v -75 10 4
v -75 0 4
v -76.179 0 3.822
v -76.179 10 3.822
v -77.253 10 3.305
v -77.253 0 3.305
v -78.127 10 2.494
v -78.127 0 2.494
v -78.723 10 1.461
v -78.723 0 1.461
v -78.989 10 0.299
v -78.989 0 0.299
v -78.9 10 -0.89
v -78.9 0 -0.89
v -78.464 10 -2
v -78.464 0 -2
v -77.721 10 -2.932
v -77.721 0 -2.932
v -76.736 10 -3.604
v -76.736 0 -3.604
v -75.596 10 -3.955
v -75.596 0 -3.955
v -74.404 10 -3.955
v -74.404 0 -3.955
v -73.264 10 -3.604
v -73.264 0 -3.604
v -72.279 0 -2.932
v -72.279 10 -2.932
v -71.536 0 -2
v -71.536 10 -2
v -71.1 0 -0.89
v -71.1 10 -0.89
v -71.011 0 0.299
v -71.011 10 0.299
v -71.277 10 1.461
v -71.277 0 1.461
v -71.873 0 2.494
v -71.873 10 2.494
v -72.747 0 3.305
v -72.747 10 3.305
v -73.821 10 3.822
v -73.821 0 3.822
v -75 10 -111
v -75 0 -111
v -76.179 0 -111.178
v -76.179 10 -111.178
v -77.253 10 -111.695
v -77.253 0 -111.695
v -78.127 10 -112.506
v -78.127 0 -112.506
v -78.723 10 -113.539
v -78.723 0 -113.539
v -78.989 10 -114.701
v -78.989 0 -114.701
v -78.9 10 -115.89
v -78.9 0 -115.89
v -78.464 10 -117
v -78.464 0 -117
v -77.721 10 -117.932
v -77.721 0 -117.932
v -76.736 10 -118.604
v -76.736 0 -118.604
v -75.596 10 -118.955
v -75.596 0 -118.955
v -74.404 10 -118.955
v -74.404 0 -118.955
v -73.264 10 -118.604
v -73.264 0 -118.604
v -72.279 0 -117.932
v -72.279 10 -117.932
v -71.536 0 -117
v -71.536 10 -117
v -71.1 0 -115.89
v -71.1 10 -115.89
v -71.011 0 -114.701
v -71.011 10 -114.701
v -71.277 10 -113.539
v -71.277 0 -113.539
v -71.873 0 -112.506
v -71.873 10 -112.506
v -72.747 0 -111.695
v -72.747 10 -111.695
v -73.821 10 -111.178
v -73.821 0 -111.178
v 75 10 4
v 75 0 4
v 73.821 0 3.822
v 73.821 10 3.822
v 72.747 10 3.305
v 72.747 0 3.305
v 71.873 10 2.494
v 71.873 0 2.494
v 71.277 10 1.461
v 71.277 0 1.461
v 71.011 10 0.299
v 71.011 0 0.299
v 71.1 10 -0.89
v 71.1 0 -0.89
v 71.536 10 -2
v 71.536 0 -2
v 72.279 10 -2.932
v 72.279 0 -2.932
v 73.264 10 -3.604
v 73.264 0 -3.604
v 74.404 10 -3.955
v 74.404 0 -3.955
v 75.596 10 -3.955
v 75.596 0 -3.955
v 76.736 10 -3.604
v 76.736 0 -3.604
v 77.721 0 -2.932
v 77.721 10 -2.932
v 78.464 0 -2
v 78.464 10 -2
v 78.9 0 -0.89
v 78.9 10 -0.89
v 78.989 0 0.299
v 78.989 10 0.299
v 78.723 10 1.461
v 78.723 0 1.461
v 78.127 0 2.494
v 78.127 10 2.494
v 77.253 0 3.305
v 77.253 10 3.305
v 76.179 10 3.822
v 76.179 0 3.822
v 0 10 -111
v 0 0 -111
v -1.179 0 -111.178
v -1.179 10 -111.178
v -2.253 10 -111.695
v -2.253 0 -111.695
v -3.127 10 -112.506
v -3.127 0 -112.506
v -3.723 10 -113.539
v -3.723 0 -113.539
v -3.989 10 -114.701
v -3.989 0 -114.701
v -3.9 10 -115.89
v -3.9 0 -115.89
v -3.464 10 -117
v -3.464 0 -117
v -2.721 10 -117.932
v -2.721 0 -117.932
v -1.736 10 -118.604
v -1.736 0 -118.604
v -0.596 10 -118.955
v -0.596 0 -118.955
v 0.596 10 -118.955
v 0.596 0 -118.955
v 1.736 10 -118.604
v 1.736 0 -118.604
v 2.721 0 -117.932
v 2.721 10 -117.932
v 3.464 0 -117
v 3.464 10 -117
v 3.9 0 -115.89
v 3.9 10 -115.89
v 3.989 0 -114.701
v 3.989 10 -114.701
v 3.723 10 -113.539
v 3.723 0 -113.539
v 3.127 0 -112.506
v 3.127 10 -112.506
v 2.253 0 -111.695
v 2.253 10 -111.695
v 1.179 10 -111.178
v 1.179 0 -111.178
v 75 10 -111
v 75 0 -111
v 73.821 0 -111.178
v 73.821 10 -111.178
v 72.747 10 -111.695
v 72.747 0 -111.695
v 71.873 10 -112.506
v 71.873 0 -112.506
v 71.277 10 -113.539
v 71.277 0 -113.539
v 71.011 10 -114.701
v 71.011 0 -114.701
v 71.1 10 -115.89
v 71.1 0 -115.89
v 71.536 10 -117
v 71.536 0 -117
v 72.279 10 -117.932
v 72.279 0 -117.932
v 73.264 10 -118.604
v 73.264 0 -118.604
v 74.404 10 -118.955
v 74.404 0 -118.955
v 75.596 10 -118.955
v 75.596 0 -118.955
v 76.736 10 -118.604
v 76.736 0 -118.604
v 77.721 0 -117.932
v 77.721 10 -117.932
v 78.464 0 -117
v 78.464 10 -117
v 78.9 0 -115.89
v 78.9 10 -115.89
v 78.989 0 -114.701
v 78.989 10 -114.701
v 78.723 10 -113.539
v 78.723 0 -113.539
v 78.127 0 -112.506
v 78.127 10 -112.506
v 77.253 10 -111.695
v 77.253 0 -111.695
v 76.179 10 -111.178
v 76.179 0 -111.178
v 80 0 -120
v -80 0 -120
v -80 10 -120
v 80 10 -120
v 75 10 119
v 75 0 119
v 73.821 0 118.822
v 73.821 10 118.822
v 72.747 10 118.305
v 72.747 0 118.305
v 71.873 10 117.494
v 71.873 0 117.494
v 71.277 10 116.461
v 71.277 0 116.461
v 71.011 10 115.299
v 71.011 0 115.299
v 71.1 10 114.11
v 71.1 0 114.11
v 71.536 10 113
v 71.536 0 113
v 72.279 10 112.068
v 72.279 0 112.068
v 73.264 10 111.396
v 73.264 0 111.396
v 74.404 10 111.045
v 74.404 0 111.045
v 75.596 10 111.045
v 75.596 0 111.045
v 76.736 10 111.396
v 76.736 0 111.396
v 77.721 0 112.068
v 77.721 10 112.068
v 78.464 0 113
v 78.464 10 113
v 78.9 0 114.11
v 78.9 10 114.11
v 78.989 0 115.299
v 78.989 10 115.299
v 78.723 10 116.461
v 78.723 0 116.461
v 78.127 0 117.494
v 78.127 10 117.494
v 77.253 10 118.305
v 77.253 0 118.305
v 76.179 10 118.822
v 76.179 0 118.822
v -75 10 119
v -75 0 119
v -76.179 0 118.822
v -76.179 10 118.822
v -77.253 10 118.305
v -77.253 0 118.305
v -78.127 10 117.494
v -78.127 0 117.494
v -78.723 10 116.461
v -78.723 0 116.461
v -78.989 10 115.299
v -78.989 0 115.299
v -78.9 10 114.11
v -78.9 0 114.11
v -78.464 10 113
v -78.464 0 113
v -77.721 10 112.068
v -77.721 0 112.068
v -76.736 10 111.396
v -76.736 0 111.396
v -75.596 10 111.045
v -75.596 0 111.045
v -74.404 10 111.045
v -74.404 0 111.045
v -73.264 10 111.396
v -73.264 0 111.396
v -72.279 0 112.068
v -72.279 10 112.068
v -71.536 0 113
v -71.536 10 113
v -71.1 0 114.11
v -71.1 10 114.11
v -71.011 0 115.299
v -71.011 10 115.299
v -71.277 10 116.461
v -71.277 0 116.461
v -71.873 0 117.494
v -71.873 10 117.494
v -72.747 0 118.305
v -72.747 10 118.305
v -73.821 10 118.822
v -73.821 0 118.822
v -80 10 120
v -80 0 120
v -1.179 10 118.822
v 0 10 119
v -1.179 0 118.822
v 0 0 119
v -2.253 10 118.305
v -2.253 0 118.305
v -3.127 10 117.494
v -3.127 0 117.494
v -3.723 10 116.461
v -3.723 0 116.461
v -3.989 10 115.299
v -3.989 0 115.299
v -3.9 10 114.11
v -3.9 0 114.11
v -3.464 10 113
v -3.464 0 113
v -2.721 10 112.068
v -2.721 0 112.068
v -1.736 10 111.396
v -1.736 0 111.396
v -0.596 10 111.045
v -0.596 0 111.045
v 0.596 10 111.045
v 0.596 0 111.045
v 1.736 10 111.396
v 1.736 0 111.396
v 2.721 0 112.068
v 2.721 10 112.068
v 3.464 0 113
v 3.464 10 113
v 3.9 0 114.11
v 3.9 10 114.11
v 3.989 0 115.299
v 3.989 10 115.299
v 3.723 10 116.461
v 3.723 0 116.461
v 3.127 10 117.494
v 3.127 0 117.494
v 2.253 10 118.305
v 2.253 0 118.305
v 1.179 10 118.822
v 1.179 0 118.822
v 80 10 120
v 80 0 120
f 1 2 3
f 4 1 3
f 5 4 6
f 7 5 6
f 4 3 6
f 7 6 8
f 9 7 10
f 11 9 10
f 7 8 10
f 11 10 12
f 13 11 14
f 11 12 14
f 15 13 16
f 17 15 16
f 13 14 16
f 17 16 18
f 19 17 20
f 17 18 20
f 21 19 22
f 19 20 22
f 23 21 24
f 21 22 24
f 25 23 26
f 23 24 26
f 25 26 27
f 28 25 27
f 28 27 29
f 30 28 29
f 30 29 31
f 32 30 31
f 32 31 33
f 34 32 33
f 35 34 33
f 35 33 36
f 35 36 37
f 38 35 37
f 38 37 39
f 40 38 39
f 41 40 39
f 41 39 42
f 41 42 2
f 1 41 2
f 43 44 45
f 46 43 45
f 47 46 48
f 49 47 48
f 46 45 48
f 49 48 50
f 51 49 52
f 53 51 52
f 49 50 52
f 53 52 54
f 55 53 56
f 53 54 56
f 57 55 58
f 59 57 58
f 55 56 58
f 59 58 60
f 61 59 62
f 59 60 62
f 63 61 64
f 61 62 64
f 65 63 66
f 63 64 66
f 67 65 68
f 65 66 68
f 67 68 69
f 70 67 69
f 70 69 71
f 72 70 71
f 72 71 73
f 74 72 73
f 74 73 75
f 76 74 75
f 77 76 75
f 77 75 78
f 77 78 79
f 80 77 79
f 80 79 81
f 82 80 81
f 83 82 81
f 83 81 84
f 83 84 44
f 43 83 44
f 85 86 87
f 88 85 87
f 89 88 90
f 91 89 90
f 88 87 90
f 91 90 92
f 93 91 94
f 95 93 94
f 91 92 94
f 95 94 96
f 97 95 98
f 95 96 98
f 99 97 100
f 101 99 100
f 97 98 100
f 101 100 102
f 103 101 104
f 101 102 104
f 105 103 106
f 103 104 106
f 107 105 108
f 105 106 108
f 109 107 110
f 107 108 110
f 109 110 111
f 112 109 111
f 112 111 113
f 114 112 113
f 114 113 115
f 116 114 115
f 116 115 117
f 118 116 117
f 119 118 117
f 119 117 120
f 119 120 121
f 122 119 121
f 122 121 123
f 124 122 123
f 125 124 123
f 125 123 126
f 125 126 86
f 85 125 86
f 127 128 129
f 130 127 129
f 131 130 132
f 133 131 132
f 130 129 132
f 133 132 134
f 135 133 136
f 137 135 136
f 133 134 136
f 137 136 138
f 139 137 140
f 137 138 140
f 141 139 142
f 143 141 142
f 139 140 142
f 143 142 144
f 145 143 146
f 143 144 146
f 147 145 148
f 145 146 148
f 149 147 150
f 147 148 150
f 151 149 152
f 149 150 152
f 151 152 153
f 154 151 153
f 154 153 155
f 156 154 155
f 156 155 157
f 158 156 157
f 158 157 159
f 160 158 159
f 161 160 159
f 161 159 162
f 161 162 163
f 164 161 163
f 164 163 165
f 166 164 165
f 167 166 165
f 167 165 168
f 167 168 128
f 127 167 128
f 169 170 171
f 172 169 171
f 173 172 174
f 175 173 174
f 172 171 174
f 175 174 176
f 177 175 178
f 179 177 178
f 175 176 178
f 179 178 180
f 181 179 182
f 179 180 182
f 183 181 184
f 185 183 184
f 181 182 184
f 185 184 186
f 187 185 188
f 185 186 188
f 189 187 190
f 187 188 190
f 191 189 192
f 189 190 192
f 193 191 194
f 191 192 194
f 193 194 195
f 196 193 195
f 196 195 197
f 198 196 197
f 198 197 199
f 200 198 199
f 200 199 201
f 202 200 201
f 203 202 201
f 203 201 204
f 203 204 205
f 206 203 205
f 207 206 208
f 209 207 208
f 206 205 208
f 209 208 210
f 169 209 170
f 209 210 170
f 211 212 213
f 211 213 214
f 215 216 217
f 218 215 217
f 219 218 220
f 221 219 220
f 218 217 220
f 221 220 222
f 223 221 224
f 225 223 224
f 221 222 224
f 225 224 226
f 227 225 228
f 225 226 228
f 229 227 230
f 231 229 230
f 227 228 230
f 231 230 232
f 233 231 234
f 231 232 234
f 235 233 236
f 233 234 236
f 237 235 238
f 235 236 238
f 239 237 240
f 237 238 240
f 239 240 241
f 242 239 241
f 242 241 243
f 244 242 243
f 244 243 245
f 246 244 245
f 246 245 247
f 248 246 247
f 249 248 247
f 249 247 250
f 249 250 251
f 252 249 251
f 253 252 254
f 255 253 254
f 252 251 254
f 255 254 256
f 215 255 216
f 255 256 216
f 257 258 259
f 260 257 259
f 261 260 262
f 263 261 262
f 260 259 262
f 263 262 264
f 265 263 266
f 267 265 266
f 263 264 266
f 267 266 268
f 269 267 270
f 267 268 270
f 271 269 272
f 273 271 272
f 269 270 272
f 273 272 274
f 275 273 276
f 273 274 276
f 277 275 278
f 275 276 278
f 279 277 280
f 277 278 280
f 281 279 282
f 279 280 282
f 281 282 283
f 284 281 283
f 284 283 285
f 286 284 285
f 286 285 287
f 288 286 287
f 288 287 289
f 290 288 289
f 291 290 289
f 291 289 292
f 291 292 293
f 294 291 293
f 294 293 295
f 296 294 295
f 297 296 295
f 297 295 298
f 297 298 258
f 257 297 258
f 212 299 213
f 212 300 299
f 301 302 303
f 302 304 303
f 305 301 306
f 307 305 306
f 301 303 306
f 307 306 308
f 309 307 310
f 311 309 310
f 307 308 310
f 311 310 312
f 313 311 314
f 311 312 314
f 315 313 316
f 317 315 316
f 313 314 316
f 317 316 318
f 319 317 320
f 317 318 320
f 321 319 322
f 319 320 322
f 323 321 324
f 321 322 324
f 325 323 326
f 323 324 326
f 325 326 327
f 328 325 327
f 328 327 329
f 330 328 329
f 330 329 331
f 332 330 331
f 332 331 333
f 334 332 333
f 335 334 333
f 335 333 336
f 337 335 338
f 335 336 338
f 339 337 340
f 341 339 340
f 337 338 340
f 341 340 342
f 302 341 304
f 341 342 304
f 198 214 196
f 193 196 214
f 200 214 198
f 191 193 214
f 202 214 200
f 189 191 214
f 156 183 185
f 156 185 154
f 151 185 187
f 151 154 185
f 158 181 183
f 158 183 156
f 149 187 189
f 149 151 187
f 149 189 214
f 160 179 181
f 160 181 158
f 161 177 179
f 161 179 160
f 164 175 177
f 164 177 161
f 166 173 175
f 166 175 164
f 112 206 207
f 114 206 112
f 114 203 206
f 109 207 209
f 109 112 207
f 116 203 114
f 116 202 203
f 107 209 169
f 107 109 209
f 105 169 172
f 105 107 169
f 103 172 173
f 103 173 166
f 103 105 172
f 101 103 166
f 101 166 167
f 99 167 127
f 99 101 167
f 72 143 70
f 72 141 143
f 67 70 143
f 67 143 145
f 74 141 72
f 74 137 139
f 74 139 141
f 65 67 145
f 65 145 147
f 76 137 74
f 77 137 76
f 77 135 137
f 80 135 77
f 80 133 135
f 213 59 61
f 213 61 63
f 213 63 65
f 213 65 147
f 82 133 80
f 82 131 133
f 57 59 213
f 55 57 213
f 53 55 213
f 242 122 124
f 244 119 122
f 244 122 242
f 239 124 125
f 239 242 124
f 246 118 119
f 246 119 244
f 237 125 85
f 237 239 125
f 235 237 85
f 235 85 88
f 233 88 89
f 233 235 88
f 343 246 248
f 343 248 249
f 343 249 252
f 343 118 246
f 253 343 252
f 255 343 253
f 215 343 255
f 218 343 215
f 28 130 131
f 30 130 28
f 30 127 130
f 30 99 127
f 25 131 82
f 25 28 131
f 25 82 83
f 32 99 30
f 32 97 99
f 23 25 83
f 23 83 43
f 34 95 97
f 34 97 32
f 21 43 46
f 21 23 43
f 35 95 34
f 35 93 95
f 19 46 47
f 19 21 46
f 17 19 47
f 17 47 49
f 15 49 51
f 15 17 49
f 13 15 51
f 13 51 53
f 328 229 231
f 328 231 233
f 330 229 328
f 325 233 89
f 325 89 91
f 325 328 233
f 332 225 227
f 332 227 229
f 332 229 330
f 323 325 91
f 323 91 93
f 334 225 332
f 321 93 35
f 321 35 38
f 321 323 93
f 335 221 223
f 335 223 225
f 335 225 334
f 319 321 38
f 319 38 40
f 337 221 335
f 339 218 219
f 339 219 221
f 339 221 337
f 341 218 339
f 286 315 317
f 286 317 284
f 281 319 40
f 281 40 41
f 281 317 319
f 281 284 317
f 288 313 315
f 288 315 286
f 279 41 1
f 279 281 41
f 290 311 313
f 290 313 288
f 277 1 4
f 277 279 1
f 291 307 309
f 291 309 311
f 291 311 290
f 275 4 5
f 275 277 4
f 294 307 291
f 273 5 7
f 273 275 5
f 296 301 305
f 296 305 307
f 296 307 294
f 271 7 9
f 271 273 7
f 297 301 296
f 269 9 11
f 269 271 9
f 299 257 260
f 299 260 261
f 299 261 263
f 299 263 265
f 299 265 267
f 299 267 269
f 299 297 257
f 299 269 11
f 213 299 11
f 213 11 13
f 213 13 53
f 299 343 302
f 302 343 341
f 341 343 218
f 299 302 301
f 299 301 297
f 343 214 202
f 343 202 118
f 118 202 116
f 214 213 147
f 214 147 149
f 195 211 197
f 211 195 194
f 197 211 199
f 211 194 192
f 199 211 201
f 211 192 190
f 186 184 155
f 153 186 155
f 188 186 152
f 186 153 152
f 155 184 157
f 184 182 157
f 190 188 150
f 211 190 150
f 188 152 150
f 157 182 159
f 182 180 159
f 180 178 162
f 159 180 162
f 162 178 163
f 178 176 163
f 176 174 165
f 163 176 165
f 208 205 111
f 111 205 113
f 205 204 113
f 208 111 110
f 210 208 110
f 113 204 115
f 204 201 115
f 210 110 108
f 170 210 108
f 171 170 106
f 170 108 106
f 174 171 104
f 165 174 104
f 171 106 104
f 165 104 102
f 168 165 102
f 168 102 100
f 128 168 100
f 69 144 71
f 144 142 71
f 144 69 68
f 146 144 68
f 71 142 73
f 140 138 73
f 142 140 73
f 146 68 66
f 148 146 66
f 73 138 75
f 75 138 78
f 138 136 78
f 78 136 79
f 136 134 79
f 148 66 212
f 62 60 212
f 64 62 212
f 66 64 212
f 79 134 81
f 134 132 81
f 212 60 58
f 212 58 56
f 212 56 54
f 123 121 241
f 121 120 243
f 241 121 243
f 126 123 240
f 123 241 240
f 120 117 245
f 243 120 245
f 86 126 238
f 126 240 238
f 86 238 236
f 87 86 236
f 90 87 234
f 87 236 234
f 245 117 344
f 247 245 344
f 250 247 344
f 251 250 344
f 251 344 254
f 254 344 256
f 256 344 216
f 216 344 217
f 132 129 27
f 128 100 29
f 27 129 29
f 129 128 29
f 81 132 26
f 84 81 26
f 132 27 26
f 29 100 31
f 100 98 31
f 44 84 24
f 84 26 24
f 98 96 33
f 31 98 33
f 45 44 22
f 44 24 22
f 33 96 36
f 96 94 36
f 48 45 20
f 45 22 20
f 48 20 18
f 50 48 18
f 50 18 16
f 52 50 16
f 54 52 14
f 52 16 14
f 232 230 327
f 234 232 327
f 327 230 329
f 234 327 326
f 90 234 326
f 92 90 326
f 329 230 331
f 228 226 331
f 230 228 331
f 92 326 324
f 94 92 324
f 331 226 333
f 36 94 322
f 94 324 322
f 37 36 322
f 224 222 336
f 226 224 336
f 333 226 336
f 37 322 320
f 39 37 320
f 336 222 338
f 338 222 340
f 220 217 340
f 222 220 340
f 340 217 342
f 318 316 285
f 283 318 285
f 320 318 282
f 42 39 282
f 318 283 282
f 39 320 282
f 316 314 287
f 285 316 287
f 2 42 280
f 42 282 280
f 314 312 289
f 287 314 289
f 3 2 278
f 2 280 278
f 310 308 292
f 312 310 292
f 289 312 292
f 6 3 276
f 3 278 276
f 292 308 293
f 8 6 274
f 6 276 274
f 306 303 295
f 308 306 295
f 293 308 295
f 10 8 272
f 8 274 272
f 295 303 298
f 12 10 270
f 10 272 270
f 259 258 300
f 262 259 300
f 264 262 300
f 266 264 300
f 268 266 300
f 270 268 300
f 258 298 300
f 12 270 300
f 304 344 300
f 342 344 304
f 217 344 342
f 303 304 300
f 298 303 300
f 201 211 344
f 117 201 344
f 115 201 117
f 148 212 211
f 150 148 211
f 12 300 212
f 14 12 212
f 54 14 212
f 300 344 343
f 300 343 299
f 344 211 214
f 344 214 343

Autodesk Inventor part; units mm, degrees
ref_plane "YZ Plane" through (0, 0, 0) normal (1, 0, 0) x (0, 1, 0)
ref_plane "XZ Plane" through (0, 0, 0) normal (0, 1, 0) x (-1, 0, 0)
ref_plane "XY Plane" through (0, 0, 0) normal (0, 0, 1) x (1, 0, 0)
sketch "Boceto1" plane through (0, 0, 0) normal (0, 1, 0) x (-1, 0, 0)
  line L0 (-80, 120) -> (80, 120)
  line L1 (80, 120) -> (80, -120)
  line L2 (80, -120) -> (-80, -120)
  line L3 (-80, -120) -> (-80, 120)
  line L4 (-80, 120) -> (80, -120) construction
  line L5 (80, 120) -> (-80, -120) construction
  point P0 (0, 0)
  dimension "d0" = 160
  dimension "d1" = 240
extrude "Extrusión1" add sketch "Boceto1" along normal blind 10
sketch "Boceto2" plane through (0, 10, 0) normal (0, 1, 0) x (1, 0, 0)
  line L0 (-80, -120) -> (80, -120) projected
  line L1 (80, -120) -> (80, 120) projected
  line L2 (80, 120) -> (-80, 120) projected
  line L3 (-80, 120) -> (-80, -120) projected
  line L4 (-75, 115) -> (75, 115) construction
  line L5 (75, 115) -> (75, -115) construction
  line L6 (75, -115) -> (-75, -115) construction
  line L7 (-75, -115) -> (-75, 115) construction
  point P0 (0, 0)
  point P1 (-75, 0)
  point P2 (75, 0)
  point P3 (0, -115)
  point P4 (0, 115)
  dimension "d4" = 5
hole "Agujero1" at (-75, 10, 0) at (75, 10, 0) at (0, 10, 115) at (0, 10, -115) at (-75, 10, -115) at (75, 10, -115) at (75, 10, 115) at (-75, 10, 115) direction (0, -1, 0) diameter 8 depth 15 tip angle 118
properties part number "TAPA SUPERIOR" material "Plástico PMMA"
